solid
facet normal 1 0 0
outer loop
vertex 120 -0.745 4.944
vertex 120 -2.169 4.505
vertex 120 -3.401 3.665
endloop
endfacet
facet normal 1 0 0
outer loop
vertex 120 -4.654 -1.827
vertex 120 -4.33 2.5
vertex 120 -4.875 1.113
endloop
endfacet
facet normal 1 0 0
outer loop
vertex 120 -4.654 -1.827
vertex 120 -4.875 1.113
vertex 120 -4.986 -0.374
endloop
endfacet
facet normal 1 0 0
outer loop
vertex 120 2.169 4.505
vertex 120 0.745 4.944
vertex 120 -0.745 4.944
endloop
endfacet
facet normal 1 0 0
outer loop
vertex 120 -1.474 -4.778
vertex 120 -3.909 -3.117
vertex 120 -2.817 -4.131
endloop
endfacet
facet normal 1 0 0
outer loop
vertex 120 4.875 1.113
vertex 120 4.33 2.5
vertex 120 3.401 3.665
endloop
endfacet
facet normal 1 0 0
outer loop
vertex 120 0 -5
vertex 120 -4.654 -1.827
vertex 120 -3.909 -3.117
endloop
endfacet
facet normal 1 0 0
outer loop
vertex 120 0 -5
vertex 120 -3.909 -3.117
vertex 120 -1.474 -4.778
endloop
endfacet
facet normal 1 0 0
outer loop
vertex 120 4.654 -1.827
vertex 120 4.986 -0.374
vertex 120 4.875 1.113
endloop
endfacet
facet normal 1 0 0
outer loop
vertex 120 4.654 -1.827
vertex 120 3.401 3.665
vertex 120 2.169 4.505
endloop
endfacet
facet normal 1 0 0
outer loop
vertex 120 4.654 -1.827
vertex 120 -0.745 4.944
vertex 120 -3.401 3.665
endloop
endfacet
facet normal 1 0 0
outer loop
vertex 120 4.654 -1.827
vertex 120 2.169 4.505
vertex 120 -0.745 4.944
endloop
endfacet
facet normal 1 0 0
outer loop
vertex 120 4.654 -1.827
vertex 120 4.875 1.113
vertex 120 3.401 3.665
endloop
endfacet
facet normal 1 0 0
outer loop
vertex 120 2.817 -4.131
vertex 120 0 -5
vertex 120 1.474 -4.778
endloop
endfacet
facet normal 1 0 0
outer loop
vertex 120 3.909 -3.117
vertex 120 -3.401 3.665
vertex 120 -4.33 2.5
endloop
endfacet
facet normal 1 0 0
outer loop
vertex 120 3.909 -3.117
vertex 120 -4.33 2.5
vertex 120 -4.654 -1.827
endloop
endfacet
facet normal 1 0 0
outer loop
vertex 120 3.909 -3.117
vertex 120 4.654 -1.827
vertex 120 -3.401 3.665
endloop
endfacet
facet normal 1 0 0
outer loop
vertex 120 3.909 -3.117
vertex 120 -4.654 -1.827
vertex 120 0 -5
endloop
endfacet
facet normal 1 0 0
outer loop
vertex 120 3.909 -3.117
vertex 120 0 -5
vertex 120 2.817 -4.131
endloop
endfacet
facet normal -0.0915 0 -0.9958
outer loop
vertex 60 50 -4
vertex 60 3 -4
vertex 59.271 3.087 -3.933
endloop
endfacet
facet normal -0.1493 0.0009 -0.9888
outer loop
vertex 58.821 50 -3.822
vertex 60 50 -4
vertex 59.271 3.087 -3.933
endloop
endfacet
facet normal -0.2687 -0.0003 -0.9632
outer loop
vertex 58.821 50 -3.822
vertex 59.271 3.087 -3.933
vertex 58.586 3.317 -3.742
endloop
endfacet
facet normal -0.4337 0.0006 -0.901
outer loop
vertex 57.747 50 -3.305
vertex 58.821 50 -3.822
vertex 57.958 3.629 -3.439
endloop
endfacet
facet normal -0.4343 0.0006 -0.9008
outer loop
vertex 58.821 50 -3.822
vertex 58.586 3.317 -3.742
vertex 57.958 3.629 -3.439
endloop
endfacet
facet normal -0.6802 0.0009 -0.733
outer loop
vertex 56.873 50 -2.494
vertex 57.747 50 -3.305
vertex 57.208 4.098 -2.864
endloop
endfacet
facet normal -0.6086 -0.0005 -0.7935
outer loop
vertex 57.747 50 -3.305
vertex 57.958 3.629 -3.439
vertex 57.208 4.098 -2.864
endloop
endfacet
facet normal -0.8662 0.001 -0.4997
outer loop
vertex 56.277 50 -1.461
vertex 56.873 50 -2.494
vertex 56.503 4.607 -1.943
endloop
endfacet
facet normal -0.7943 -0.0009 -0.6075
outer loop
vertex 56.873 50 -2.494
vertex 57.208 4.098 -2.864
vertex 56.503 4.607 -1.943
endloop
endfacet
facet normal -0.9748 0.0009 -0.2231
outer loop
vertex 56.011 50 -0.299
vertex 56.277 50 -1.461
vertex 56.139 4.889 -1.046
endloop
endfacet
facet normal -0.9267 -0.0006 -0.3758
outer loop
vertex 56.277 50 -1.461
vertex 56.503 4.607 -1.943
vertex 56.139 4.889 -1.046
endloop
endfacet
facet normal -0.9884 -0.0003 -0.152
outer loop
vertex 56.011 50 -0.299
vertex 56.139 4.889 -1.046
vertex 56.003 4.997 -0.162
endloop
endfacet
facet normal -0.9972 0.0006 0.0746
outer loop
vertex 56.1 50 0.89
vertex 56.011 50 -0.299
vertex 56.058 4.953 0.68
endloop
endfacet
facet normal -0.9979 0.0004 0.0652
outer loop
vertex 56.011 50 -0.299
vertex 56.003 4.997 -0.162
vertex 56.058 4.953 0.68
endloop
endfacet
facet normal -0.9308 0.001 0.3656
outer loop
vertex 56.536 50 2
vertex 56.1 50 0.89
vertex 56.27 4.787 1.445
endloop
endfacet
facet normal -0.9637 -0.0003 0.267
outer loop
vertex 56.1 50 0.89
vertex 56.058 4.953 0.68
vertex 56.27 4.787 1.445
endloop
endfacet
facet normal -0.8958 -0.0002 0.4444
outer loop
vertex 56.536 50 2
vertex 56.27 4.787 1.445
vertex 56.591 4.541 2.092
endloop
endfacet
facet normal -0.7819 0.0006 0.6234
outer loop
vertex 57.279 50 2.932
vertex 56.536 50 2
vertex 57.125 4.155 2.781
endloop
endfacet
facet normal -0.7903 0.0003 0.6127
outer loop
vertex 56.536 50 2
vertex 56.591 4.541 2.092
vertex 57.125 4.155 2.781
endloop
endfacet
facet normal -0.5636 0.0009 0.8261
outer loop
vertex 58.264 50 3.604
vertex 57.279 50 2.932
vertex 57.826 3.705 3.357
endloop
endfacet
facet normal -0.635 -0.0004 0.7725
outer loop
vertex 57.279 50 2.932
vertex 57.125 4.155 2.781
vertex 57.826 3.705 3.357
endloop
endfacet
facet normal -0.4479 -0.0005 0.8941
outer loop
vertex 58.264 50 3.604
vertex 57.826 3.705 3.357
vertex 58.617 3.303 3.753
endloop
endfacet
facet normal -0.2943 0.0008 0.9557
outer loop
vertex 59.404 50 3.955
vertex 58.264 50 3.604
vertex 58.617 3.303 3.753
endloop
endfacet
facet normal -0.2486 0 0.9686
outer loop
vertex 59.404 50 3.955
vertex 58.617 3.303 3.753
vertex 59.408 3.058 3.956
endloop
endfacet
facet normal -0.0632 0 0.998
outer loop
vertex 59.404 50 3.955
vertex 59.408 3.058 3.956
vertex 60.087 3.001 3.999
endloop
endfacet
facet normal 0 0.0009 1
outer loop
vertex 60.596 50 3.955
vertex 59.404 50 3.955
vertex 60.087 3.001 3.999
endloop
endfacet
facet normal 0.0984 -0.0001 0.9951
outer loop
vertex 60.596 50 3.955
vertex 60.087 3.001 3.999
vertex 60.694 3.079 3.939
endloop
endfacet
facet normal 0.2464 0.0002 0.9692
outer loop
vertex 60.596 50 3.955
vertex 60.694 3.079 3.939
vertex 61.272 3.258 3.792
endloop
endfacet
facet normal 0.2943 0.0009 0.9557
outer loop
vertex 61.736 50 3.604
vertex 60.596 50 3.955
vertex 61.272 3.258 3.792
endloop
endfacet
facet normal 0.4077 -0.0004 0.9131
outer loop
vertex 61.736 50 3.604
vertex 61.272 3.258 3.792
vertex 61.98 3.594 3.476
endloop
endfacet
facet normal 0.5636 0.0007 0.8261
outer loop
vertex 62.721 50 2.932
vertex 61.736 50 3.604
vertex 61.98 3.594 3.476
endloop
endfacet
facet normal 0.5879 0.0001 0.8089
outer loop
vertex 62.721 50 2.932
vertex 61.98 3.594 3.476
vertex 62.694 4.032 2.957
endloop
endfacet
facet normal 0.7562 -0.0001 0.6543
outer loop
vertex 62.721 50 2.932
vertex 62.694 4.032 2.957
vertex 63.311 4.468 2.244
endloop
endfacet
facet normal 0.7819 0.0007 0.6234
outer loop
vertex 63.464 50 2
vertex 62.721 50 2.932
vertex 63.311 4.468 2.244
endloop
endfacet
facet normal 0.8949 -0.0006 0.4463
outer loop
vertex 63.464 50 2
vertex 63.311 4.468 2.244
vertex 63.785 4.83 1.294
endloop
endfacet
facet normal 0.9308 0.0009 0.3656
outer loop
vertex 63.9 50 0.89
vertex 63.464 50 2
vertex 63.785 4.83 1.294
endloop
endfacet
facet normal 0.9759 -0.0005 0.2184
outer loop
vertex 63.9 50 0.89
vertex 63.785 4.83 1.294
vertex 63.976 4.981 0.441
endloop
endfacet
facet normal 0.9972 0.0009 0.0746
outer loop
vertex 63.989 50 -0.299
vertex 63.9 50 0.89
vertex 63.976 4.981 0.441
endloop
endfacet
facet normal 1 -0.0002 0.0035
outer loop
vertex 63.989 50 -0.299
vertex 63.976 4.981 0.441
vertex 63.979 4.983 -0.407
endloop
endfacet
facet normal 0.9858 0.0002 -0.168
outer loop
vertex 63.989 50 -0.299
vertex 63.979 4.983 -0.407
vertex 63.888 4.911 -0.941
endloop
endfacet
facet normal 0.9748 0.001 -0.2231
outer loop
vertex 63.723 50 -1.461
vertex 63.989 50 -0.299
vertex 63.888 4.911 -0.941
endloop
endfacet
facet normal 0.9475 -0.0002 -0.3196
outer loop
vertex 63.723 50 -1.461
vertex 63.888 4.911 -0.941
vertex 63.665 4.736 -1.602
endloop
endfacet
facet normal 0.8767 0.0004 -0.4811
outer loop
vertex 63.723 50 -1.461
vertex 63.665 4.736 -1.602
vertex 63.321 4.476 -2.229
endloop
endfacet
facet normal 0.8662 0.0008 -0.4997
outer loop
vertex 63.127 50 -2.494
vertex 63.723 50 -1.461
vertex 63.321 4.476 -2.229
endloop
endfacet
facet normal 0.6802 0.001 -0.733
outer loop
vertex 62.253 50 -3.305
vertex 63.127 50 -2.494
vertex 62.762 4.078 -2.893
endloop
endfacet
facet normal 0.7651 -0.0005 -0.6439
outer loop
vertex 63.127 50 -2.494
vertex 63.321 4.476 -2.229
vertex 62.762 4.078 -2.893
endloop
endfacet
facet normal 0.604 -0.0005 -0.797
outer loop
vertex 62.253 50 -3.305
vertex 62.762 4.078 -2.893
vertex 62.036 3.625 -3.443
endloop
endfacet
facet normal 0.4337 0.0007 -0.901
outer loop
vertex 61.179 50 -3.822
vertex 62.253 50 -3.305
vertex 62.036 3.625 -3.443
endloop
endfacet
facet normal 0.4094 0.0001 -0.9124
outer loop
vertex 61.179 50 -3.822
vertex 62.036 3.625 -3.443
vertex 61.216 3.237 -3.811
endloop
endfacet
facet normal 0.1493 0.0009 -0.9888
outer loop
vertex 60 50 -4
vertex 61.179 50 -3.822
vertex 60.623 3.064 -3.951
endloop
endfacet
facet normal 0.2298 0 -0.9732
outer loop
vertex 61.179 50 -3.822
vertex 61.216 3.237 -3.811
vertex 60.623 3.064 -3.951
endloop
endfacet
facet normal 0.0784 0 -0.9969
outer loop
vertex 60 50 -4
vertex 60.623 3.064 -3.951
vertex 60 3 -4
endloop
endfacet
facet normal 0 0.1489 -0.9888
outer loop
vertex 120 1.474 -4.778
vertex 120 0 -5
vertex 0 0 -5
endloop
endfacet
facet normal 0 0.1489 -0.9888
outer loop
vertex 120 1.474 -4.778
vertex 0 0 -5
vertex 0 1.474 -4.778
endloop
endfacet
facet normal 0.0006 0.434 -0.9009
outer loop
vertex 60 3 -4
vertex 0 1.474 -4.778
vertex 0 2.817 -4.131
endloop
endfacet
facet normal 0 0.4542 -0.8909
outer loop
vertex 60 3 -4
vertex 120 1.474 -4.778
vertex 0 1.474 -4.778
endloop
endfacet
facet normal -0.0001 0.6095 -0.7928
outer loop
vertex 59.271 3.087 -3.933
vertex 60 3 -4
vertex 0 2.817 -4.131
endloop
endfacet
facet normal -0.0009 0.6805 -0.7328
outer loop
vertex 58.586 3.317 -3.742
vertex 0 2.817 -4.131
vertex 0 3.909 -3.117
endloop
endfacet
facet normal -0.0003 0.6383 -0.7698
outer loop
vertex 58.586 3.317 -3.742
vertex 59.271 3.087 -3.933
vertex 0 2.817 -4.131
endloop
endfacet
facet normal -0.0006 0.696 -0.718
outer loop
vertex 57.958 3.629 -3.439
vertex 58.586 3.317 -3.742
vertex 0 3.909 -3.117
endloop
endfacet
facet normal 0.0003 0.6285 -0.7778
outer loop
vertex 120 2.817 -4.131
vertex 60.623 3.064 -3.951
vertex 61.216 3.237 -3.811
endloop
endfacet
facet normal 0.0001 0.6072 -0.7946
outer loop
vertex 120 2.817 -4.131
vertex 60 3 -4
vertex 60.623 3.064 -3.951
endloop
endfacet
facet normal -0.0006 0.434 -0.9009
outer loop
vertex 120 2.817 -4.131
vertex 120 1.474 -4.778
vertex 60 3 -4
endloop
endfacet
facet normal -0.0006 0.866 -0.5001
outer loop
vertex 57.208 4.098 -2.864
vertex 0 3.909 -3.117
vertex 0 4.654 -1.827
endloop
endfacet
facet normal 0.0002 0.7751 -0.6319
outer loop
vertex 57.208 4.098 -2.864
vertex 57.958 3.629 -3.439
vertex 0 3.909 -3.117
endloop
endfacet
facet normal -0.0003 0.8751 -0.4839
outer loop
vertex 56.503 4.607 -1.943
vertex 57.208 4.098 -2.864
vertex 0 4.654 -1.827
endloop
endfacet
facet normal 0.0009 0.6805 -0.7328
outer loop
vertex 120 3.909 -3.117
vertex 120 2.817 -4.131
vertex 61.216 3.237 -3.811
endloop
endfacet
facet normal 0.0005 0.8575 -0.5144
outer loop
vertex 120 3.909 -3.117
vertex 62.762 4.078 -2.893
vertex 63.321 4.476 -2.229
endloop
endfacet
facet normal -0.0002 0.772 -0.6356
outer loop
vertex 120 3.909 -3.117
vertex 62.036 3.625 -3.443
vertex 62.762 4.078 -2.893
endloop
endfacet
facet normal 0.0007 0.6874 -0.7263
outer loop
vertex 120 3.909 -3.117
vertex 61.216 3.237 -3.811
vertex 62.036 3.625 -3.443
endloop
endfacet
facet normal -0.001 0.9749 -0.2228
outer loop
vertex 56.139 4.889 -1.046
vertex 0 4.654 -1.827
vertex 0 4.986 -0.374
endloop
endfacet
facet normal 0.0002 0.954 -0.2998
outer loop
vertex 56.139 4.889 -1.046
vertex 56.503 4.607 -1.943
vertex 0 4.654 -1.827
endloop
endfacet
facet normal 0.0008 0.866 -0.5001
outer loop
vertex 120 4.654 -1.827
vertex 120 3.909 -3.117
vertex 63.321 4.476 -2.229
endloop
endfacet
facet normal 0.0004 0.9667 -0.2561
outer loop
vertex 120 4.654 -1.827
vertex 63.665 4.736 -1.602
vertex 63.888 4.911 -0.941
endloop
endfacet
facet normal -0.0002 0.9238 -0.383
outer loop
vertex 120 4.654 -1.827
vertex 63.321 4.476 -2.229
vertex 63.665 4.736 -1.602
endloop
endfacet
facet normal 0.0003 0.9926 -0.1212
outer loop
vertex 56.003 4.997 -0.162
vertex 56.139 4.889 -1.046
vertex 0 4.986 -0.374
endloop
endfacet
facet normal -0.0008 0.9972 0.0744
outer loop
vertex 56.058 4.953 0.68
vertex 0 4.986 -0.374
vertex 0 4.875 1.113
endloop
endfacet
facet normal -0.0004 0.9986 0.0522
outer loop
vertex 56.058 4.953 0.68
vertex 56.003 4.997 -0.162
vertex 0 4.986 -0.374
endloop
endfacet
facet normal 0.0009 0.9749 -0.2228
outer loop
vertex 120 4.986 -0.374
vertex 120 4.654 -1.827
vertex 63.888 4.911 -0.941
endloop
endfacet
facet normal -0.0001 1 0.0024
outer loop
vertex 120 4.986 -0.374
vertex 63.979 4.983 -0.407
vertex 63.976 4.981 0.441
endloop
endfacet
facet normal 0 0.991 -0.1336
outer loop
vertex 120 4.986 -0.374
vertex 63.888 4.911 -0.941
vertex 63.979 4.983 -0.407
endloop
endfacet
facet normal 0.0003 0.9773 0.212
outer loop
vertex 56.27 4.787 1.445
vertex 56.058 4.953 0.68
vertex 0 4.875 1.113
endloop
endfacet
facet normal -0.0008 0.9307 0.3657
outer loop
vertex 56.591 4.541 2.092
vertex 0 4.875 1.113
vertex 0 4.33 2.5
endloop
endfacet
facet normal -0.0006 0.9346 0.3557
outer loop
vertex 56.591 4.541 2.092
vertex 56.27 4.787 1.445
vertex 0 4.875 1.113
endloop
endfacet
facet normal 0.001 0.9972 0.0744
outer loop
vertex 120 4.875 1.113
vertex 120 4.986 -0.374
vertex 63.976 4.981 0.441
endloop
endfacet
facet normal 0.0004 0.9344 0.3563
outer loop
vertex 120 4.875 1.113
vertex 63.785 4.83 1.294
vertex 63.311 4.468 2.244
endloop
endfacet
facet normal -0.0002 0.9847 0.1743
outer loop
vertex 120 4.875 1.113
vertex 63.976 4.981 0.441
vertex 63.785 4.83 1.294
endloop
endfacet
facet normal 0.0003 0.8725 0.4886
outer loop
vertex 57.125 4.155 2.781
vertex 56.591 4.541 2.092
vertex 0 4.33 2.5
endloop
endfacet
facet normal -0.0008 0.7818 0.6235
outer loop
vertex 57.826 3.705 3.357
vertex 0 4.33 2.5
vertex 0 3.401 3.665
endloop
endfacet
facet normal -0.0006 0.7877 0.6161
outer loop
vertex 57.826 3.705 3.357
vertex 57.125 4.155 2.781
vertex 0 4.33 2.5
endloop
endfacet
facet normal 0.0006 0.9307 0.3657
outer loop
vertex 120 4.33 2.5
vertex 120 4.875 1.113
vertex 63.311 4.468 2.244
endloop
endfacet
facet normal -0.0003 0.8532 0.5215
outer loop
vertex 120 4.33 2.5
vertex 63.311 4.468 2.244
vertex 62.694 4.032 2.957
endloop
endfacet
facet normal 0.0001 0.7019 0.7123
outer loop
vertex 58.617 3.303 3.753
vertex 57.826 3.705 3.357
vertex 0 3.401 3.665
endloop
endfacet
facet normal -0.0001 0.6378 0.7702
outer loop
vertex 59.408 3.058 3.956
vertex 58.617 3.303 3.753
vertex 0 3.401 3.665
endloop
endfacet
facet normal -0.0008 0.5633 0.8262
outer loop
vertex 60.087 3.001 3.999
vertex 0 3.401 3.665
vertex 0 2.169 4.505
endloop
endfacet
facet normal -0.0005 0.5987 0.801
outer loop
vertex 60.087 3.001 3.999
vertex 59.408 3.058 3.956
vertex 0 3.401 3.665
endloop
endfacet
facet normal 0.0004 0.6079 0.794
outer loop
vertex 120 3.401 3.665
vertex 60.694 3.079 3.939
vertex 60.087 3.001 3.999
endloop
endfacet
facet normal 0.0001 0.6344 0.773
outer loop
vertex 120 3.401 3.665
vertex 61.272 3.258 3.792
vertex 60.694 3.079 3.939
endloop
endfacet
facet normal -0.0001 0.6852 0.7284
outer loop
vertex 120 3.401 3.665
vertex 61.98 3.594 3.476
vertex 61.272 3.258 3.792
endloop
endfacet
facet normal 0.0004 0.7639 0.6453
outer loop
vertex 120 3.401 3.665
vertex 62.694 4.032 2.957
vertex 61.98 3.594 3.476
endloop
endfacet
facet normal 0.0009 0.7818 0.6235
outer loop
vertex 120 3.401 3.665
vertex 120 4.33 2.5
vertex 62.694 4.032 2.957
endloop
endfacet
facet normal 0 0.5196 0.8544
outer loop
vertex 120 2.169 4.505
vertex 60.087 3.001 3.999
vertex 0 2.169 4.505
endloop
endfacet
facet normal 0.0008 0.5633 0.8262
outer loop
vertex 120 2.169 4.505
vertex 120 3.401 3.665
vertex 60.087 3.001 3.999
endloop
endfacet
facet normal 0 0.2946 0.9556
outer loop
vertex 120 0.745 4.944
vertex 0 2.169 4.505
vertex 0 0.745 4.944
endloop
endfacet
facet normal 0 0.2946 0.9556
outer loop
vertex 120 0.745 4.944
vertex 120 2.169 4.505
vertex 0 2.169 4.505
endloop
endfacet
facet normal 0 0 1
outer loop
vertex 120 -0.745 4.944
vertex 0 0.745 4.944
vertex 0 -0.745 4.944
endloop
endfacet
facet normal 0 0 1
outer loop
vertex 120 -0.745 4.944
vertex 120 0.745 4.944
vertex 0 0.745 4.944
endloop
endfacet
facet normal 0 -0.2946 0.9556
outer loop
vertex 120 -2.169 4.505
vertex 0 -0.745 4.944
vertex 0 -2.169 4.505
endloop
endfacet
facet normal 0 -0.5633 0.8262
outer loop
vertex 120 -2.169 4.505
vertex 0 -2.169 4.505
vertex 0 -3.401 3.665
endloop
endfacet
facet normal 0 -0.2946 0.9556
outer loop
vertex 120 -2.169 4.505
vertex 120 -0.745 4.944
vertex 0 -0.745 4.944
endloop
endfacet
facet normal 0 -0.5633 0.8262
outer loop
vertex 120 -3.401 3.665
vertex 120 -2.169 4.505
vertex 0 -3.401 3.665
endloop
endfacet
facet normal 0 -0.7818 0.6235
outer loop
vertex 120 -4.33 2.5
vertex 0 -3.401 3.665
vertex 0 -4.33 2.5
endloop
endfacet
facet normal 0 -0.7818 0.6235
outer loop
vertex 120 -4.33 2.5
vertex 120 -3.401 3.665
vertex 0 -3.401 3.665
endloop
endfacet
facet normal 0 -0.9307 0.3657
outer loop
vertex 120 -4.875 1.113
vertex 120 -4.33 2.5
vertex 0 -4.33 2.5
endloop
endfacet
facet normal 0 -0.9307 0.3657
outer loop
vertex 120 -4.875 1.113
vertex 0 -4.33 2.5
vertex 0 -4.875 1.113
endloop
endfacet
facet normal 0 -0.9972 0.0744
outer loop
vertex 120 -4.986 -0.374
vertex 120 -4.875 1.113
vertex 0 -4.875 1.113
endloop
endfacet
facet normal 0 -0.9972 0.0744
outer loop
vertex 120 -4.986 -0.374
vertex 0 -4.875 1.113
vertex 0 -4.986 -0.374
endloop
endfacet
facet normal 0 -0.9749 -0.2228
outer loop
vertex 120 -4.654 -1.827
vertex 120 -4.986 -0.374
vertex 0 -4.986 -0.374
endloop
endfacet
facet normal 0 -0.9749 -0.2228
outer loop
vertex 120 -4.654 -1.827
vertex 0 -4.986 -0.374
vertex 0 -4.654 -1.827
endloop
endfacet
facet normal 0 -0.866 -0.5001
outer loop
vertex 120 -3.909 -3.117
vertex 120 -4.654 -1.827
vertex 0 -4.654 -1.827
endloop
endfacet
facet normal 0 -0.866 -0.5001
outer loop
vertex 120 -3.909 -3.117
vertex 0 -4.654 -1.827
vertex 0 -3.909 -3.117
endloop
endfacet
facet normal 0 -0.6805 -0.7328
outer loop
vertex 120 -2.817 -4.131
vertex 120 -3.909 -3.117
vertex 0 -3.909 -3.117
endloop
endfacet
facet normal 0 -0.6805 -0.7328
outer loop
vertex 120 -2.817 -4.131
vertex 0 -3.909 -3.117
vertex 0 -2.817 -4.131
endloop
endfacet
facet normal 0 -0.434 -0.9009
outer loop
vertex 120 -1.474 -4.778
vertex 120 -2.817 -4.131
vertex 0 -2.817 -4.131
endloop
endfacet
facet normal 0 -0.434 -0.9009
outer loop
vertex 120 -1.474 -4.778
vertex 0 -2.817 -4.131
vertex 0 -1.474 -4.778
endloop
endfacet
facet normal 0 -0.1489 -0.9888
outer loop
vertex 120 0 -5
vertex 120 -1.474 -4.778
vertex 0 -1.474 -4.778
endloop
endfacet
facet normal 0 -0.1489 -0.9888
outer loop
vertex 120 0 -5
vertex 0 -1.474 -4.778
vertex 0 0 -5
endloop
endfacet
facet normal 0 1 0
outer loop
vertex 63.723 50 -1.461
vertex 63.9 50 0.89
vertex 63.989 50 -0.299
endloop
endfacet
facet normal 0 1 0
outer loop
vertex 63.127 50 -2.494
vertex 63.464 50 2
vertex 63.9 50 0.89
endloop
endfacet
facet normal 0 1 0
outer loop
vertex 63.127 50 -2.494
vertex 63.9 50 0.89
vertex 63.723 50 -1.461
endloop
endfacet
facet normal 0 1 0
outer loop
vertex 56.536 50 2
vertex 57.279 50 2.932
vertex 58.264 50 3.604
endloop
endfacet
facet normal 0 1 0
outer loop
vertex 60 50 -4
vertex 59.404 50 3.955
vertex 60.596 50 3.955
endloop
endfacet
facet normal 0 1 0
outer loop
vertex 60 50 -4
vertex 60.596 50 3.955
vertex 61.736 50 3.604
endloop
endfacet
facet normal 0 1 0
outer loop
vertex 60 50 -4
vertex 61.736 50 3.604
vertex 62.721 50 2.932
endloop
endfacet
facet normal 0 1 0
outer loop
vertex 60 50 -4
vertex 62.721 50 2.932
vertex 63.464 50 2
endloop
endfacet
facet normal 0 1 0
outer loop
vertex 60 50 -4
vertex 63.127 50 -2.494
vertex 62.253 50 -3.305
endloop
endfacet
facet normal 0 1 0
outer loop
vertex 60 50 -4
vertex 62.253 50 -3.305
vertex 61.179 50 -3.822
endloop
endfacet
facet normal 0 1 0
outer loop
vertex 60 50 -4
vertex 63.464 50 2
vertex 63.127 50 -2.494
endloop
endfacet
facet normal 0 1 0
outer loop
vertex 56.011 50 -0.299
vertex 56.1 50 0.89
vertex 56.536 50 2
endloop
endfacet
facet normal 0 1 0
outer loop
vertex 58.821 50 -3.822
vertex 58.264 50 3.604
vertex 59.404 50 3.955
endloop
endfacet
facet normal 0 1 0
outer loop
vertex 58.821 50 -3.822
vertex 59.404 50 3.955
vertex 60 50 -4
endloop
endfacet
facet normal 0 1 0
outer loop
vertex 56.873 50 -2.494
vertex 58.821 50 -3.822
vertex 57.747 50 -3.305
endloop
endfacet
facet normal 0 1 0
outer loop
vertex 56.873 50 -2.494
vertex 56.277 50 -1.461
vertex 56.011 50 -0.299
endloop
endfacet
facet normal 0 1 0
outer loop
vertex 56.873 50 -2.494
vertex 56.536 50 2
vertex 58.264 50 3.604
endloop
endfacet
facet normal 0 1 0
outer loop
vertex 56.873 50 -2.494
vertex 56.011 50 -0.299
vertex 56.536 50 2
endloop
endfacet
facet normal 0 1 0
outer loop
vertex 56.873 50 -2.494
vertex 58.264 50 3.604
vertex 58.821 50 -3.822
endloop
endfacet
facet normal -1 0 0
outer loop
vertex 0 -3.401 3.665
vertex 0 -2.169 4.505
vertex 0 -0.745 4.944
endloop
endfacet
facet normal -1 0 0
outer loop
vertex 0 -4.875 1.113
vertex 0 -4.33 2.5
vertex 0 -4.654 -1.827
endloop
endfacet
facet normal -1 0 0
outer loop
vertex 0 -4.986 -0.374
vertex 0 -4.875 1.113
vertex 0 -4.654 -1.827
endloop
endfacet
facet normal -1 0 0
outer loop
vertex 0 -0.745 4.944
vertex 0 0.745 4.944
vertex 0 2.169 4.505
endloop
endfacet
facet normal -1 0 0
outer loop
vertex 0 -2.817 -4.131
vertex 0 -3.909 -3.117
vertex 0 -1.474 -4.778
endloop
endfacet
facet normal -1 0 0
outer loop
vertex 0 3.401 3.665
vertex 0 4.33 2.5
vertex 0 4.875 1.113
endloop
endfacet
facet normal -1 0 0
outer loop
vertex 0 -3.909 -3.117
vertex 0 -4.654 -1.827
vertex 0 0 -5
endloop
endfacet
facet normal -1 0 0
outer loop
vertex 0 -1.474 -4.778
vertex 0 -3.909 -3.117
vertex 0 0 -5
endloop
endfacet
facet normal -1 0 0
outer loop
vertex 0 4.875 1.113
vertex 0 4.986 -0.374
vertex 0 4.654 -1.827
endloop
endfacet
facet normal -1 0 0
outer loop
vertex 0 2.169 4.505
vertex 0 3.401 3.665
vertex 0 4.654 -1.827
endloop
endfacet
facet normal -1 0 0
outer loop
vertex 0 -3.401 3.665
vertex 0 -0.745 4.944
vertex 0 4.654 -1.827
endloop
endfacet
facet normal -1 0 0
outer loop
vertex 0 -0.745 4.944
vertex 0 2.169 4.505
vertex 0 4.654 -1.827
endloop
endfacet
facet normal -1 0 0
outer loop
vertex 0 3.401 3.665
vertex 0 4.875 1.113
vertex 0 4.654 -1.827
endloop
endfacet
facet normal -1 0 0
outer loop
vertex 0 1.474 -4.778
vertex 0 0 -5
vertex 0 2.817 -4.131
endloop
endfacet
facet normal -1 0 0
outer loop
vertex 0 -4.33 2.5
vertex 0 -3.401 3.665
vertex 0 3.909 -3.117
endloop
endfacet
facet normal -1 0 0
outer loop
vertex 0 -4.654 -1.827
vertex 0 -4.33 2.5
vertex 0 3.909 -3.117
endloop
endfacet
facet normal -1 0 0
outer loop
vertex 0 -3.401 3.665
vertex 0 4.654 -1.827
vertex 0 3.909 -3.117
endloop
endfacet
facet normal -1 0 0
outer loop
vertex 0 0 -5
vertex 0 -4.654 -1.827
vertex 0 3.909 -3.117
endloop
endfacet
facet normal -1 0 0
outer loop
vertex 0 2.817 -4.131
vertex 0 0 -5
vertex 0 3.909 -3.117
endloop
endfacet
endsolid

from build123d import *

# Parameters (mm, degrees)
SKETCH_1_R      = 5
EXTRUDE_1_DEPTH = 60
SKETCH_2_R      = 4
EXTRUDE_2_DEPTH = 50


with BuildPart() as part:
    # 草图1 → 凸台-拉伸1 (new, symmetric)
    with BuildSketch(Plane(origin=(0, 0, 0), x_dir=(0, 0, -1), z_dir=(1, 0, 0))):
        Circle(SKETCH_1_R)
    extrude(amount=EXTRUDE_1_DEPTH, both=True)

    # 草图2 → 凸台-拉伸2 (add)
    with BuildSketch(Plane(origin=(0, 0, 0), x_dir=(1, 0, 0), z_dir=(0, 1, 0))):
        with Locations(Location((0, 0, 0), (0, 0, 90))):
            Circle(SKETCH_2_R)
    extrude(amount=EXTRUDE_2_DEPTH)


with BuildPart() as part_1:
    # Move Body 1: moved
    add(part.part.moved(Location((60, 0, 0))))


solid = part_1.part
